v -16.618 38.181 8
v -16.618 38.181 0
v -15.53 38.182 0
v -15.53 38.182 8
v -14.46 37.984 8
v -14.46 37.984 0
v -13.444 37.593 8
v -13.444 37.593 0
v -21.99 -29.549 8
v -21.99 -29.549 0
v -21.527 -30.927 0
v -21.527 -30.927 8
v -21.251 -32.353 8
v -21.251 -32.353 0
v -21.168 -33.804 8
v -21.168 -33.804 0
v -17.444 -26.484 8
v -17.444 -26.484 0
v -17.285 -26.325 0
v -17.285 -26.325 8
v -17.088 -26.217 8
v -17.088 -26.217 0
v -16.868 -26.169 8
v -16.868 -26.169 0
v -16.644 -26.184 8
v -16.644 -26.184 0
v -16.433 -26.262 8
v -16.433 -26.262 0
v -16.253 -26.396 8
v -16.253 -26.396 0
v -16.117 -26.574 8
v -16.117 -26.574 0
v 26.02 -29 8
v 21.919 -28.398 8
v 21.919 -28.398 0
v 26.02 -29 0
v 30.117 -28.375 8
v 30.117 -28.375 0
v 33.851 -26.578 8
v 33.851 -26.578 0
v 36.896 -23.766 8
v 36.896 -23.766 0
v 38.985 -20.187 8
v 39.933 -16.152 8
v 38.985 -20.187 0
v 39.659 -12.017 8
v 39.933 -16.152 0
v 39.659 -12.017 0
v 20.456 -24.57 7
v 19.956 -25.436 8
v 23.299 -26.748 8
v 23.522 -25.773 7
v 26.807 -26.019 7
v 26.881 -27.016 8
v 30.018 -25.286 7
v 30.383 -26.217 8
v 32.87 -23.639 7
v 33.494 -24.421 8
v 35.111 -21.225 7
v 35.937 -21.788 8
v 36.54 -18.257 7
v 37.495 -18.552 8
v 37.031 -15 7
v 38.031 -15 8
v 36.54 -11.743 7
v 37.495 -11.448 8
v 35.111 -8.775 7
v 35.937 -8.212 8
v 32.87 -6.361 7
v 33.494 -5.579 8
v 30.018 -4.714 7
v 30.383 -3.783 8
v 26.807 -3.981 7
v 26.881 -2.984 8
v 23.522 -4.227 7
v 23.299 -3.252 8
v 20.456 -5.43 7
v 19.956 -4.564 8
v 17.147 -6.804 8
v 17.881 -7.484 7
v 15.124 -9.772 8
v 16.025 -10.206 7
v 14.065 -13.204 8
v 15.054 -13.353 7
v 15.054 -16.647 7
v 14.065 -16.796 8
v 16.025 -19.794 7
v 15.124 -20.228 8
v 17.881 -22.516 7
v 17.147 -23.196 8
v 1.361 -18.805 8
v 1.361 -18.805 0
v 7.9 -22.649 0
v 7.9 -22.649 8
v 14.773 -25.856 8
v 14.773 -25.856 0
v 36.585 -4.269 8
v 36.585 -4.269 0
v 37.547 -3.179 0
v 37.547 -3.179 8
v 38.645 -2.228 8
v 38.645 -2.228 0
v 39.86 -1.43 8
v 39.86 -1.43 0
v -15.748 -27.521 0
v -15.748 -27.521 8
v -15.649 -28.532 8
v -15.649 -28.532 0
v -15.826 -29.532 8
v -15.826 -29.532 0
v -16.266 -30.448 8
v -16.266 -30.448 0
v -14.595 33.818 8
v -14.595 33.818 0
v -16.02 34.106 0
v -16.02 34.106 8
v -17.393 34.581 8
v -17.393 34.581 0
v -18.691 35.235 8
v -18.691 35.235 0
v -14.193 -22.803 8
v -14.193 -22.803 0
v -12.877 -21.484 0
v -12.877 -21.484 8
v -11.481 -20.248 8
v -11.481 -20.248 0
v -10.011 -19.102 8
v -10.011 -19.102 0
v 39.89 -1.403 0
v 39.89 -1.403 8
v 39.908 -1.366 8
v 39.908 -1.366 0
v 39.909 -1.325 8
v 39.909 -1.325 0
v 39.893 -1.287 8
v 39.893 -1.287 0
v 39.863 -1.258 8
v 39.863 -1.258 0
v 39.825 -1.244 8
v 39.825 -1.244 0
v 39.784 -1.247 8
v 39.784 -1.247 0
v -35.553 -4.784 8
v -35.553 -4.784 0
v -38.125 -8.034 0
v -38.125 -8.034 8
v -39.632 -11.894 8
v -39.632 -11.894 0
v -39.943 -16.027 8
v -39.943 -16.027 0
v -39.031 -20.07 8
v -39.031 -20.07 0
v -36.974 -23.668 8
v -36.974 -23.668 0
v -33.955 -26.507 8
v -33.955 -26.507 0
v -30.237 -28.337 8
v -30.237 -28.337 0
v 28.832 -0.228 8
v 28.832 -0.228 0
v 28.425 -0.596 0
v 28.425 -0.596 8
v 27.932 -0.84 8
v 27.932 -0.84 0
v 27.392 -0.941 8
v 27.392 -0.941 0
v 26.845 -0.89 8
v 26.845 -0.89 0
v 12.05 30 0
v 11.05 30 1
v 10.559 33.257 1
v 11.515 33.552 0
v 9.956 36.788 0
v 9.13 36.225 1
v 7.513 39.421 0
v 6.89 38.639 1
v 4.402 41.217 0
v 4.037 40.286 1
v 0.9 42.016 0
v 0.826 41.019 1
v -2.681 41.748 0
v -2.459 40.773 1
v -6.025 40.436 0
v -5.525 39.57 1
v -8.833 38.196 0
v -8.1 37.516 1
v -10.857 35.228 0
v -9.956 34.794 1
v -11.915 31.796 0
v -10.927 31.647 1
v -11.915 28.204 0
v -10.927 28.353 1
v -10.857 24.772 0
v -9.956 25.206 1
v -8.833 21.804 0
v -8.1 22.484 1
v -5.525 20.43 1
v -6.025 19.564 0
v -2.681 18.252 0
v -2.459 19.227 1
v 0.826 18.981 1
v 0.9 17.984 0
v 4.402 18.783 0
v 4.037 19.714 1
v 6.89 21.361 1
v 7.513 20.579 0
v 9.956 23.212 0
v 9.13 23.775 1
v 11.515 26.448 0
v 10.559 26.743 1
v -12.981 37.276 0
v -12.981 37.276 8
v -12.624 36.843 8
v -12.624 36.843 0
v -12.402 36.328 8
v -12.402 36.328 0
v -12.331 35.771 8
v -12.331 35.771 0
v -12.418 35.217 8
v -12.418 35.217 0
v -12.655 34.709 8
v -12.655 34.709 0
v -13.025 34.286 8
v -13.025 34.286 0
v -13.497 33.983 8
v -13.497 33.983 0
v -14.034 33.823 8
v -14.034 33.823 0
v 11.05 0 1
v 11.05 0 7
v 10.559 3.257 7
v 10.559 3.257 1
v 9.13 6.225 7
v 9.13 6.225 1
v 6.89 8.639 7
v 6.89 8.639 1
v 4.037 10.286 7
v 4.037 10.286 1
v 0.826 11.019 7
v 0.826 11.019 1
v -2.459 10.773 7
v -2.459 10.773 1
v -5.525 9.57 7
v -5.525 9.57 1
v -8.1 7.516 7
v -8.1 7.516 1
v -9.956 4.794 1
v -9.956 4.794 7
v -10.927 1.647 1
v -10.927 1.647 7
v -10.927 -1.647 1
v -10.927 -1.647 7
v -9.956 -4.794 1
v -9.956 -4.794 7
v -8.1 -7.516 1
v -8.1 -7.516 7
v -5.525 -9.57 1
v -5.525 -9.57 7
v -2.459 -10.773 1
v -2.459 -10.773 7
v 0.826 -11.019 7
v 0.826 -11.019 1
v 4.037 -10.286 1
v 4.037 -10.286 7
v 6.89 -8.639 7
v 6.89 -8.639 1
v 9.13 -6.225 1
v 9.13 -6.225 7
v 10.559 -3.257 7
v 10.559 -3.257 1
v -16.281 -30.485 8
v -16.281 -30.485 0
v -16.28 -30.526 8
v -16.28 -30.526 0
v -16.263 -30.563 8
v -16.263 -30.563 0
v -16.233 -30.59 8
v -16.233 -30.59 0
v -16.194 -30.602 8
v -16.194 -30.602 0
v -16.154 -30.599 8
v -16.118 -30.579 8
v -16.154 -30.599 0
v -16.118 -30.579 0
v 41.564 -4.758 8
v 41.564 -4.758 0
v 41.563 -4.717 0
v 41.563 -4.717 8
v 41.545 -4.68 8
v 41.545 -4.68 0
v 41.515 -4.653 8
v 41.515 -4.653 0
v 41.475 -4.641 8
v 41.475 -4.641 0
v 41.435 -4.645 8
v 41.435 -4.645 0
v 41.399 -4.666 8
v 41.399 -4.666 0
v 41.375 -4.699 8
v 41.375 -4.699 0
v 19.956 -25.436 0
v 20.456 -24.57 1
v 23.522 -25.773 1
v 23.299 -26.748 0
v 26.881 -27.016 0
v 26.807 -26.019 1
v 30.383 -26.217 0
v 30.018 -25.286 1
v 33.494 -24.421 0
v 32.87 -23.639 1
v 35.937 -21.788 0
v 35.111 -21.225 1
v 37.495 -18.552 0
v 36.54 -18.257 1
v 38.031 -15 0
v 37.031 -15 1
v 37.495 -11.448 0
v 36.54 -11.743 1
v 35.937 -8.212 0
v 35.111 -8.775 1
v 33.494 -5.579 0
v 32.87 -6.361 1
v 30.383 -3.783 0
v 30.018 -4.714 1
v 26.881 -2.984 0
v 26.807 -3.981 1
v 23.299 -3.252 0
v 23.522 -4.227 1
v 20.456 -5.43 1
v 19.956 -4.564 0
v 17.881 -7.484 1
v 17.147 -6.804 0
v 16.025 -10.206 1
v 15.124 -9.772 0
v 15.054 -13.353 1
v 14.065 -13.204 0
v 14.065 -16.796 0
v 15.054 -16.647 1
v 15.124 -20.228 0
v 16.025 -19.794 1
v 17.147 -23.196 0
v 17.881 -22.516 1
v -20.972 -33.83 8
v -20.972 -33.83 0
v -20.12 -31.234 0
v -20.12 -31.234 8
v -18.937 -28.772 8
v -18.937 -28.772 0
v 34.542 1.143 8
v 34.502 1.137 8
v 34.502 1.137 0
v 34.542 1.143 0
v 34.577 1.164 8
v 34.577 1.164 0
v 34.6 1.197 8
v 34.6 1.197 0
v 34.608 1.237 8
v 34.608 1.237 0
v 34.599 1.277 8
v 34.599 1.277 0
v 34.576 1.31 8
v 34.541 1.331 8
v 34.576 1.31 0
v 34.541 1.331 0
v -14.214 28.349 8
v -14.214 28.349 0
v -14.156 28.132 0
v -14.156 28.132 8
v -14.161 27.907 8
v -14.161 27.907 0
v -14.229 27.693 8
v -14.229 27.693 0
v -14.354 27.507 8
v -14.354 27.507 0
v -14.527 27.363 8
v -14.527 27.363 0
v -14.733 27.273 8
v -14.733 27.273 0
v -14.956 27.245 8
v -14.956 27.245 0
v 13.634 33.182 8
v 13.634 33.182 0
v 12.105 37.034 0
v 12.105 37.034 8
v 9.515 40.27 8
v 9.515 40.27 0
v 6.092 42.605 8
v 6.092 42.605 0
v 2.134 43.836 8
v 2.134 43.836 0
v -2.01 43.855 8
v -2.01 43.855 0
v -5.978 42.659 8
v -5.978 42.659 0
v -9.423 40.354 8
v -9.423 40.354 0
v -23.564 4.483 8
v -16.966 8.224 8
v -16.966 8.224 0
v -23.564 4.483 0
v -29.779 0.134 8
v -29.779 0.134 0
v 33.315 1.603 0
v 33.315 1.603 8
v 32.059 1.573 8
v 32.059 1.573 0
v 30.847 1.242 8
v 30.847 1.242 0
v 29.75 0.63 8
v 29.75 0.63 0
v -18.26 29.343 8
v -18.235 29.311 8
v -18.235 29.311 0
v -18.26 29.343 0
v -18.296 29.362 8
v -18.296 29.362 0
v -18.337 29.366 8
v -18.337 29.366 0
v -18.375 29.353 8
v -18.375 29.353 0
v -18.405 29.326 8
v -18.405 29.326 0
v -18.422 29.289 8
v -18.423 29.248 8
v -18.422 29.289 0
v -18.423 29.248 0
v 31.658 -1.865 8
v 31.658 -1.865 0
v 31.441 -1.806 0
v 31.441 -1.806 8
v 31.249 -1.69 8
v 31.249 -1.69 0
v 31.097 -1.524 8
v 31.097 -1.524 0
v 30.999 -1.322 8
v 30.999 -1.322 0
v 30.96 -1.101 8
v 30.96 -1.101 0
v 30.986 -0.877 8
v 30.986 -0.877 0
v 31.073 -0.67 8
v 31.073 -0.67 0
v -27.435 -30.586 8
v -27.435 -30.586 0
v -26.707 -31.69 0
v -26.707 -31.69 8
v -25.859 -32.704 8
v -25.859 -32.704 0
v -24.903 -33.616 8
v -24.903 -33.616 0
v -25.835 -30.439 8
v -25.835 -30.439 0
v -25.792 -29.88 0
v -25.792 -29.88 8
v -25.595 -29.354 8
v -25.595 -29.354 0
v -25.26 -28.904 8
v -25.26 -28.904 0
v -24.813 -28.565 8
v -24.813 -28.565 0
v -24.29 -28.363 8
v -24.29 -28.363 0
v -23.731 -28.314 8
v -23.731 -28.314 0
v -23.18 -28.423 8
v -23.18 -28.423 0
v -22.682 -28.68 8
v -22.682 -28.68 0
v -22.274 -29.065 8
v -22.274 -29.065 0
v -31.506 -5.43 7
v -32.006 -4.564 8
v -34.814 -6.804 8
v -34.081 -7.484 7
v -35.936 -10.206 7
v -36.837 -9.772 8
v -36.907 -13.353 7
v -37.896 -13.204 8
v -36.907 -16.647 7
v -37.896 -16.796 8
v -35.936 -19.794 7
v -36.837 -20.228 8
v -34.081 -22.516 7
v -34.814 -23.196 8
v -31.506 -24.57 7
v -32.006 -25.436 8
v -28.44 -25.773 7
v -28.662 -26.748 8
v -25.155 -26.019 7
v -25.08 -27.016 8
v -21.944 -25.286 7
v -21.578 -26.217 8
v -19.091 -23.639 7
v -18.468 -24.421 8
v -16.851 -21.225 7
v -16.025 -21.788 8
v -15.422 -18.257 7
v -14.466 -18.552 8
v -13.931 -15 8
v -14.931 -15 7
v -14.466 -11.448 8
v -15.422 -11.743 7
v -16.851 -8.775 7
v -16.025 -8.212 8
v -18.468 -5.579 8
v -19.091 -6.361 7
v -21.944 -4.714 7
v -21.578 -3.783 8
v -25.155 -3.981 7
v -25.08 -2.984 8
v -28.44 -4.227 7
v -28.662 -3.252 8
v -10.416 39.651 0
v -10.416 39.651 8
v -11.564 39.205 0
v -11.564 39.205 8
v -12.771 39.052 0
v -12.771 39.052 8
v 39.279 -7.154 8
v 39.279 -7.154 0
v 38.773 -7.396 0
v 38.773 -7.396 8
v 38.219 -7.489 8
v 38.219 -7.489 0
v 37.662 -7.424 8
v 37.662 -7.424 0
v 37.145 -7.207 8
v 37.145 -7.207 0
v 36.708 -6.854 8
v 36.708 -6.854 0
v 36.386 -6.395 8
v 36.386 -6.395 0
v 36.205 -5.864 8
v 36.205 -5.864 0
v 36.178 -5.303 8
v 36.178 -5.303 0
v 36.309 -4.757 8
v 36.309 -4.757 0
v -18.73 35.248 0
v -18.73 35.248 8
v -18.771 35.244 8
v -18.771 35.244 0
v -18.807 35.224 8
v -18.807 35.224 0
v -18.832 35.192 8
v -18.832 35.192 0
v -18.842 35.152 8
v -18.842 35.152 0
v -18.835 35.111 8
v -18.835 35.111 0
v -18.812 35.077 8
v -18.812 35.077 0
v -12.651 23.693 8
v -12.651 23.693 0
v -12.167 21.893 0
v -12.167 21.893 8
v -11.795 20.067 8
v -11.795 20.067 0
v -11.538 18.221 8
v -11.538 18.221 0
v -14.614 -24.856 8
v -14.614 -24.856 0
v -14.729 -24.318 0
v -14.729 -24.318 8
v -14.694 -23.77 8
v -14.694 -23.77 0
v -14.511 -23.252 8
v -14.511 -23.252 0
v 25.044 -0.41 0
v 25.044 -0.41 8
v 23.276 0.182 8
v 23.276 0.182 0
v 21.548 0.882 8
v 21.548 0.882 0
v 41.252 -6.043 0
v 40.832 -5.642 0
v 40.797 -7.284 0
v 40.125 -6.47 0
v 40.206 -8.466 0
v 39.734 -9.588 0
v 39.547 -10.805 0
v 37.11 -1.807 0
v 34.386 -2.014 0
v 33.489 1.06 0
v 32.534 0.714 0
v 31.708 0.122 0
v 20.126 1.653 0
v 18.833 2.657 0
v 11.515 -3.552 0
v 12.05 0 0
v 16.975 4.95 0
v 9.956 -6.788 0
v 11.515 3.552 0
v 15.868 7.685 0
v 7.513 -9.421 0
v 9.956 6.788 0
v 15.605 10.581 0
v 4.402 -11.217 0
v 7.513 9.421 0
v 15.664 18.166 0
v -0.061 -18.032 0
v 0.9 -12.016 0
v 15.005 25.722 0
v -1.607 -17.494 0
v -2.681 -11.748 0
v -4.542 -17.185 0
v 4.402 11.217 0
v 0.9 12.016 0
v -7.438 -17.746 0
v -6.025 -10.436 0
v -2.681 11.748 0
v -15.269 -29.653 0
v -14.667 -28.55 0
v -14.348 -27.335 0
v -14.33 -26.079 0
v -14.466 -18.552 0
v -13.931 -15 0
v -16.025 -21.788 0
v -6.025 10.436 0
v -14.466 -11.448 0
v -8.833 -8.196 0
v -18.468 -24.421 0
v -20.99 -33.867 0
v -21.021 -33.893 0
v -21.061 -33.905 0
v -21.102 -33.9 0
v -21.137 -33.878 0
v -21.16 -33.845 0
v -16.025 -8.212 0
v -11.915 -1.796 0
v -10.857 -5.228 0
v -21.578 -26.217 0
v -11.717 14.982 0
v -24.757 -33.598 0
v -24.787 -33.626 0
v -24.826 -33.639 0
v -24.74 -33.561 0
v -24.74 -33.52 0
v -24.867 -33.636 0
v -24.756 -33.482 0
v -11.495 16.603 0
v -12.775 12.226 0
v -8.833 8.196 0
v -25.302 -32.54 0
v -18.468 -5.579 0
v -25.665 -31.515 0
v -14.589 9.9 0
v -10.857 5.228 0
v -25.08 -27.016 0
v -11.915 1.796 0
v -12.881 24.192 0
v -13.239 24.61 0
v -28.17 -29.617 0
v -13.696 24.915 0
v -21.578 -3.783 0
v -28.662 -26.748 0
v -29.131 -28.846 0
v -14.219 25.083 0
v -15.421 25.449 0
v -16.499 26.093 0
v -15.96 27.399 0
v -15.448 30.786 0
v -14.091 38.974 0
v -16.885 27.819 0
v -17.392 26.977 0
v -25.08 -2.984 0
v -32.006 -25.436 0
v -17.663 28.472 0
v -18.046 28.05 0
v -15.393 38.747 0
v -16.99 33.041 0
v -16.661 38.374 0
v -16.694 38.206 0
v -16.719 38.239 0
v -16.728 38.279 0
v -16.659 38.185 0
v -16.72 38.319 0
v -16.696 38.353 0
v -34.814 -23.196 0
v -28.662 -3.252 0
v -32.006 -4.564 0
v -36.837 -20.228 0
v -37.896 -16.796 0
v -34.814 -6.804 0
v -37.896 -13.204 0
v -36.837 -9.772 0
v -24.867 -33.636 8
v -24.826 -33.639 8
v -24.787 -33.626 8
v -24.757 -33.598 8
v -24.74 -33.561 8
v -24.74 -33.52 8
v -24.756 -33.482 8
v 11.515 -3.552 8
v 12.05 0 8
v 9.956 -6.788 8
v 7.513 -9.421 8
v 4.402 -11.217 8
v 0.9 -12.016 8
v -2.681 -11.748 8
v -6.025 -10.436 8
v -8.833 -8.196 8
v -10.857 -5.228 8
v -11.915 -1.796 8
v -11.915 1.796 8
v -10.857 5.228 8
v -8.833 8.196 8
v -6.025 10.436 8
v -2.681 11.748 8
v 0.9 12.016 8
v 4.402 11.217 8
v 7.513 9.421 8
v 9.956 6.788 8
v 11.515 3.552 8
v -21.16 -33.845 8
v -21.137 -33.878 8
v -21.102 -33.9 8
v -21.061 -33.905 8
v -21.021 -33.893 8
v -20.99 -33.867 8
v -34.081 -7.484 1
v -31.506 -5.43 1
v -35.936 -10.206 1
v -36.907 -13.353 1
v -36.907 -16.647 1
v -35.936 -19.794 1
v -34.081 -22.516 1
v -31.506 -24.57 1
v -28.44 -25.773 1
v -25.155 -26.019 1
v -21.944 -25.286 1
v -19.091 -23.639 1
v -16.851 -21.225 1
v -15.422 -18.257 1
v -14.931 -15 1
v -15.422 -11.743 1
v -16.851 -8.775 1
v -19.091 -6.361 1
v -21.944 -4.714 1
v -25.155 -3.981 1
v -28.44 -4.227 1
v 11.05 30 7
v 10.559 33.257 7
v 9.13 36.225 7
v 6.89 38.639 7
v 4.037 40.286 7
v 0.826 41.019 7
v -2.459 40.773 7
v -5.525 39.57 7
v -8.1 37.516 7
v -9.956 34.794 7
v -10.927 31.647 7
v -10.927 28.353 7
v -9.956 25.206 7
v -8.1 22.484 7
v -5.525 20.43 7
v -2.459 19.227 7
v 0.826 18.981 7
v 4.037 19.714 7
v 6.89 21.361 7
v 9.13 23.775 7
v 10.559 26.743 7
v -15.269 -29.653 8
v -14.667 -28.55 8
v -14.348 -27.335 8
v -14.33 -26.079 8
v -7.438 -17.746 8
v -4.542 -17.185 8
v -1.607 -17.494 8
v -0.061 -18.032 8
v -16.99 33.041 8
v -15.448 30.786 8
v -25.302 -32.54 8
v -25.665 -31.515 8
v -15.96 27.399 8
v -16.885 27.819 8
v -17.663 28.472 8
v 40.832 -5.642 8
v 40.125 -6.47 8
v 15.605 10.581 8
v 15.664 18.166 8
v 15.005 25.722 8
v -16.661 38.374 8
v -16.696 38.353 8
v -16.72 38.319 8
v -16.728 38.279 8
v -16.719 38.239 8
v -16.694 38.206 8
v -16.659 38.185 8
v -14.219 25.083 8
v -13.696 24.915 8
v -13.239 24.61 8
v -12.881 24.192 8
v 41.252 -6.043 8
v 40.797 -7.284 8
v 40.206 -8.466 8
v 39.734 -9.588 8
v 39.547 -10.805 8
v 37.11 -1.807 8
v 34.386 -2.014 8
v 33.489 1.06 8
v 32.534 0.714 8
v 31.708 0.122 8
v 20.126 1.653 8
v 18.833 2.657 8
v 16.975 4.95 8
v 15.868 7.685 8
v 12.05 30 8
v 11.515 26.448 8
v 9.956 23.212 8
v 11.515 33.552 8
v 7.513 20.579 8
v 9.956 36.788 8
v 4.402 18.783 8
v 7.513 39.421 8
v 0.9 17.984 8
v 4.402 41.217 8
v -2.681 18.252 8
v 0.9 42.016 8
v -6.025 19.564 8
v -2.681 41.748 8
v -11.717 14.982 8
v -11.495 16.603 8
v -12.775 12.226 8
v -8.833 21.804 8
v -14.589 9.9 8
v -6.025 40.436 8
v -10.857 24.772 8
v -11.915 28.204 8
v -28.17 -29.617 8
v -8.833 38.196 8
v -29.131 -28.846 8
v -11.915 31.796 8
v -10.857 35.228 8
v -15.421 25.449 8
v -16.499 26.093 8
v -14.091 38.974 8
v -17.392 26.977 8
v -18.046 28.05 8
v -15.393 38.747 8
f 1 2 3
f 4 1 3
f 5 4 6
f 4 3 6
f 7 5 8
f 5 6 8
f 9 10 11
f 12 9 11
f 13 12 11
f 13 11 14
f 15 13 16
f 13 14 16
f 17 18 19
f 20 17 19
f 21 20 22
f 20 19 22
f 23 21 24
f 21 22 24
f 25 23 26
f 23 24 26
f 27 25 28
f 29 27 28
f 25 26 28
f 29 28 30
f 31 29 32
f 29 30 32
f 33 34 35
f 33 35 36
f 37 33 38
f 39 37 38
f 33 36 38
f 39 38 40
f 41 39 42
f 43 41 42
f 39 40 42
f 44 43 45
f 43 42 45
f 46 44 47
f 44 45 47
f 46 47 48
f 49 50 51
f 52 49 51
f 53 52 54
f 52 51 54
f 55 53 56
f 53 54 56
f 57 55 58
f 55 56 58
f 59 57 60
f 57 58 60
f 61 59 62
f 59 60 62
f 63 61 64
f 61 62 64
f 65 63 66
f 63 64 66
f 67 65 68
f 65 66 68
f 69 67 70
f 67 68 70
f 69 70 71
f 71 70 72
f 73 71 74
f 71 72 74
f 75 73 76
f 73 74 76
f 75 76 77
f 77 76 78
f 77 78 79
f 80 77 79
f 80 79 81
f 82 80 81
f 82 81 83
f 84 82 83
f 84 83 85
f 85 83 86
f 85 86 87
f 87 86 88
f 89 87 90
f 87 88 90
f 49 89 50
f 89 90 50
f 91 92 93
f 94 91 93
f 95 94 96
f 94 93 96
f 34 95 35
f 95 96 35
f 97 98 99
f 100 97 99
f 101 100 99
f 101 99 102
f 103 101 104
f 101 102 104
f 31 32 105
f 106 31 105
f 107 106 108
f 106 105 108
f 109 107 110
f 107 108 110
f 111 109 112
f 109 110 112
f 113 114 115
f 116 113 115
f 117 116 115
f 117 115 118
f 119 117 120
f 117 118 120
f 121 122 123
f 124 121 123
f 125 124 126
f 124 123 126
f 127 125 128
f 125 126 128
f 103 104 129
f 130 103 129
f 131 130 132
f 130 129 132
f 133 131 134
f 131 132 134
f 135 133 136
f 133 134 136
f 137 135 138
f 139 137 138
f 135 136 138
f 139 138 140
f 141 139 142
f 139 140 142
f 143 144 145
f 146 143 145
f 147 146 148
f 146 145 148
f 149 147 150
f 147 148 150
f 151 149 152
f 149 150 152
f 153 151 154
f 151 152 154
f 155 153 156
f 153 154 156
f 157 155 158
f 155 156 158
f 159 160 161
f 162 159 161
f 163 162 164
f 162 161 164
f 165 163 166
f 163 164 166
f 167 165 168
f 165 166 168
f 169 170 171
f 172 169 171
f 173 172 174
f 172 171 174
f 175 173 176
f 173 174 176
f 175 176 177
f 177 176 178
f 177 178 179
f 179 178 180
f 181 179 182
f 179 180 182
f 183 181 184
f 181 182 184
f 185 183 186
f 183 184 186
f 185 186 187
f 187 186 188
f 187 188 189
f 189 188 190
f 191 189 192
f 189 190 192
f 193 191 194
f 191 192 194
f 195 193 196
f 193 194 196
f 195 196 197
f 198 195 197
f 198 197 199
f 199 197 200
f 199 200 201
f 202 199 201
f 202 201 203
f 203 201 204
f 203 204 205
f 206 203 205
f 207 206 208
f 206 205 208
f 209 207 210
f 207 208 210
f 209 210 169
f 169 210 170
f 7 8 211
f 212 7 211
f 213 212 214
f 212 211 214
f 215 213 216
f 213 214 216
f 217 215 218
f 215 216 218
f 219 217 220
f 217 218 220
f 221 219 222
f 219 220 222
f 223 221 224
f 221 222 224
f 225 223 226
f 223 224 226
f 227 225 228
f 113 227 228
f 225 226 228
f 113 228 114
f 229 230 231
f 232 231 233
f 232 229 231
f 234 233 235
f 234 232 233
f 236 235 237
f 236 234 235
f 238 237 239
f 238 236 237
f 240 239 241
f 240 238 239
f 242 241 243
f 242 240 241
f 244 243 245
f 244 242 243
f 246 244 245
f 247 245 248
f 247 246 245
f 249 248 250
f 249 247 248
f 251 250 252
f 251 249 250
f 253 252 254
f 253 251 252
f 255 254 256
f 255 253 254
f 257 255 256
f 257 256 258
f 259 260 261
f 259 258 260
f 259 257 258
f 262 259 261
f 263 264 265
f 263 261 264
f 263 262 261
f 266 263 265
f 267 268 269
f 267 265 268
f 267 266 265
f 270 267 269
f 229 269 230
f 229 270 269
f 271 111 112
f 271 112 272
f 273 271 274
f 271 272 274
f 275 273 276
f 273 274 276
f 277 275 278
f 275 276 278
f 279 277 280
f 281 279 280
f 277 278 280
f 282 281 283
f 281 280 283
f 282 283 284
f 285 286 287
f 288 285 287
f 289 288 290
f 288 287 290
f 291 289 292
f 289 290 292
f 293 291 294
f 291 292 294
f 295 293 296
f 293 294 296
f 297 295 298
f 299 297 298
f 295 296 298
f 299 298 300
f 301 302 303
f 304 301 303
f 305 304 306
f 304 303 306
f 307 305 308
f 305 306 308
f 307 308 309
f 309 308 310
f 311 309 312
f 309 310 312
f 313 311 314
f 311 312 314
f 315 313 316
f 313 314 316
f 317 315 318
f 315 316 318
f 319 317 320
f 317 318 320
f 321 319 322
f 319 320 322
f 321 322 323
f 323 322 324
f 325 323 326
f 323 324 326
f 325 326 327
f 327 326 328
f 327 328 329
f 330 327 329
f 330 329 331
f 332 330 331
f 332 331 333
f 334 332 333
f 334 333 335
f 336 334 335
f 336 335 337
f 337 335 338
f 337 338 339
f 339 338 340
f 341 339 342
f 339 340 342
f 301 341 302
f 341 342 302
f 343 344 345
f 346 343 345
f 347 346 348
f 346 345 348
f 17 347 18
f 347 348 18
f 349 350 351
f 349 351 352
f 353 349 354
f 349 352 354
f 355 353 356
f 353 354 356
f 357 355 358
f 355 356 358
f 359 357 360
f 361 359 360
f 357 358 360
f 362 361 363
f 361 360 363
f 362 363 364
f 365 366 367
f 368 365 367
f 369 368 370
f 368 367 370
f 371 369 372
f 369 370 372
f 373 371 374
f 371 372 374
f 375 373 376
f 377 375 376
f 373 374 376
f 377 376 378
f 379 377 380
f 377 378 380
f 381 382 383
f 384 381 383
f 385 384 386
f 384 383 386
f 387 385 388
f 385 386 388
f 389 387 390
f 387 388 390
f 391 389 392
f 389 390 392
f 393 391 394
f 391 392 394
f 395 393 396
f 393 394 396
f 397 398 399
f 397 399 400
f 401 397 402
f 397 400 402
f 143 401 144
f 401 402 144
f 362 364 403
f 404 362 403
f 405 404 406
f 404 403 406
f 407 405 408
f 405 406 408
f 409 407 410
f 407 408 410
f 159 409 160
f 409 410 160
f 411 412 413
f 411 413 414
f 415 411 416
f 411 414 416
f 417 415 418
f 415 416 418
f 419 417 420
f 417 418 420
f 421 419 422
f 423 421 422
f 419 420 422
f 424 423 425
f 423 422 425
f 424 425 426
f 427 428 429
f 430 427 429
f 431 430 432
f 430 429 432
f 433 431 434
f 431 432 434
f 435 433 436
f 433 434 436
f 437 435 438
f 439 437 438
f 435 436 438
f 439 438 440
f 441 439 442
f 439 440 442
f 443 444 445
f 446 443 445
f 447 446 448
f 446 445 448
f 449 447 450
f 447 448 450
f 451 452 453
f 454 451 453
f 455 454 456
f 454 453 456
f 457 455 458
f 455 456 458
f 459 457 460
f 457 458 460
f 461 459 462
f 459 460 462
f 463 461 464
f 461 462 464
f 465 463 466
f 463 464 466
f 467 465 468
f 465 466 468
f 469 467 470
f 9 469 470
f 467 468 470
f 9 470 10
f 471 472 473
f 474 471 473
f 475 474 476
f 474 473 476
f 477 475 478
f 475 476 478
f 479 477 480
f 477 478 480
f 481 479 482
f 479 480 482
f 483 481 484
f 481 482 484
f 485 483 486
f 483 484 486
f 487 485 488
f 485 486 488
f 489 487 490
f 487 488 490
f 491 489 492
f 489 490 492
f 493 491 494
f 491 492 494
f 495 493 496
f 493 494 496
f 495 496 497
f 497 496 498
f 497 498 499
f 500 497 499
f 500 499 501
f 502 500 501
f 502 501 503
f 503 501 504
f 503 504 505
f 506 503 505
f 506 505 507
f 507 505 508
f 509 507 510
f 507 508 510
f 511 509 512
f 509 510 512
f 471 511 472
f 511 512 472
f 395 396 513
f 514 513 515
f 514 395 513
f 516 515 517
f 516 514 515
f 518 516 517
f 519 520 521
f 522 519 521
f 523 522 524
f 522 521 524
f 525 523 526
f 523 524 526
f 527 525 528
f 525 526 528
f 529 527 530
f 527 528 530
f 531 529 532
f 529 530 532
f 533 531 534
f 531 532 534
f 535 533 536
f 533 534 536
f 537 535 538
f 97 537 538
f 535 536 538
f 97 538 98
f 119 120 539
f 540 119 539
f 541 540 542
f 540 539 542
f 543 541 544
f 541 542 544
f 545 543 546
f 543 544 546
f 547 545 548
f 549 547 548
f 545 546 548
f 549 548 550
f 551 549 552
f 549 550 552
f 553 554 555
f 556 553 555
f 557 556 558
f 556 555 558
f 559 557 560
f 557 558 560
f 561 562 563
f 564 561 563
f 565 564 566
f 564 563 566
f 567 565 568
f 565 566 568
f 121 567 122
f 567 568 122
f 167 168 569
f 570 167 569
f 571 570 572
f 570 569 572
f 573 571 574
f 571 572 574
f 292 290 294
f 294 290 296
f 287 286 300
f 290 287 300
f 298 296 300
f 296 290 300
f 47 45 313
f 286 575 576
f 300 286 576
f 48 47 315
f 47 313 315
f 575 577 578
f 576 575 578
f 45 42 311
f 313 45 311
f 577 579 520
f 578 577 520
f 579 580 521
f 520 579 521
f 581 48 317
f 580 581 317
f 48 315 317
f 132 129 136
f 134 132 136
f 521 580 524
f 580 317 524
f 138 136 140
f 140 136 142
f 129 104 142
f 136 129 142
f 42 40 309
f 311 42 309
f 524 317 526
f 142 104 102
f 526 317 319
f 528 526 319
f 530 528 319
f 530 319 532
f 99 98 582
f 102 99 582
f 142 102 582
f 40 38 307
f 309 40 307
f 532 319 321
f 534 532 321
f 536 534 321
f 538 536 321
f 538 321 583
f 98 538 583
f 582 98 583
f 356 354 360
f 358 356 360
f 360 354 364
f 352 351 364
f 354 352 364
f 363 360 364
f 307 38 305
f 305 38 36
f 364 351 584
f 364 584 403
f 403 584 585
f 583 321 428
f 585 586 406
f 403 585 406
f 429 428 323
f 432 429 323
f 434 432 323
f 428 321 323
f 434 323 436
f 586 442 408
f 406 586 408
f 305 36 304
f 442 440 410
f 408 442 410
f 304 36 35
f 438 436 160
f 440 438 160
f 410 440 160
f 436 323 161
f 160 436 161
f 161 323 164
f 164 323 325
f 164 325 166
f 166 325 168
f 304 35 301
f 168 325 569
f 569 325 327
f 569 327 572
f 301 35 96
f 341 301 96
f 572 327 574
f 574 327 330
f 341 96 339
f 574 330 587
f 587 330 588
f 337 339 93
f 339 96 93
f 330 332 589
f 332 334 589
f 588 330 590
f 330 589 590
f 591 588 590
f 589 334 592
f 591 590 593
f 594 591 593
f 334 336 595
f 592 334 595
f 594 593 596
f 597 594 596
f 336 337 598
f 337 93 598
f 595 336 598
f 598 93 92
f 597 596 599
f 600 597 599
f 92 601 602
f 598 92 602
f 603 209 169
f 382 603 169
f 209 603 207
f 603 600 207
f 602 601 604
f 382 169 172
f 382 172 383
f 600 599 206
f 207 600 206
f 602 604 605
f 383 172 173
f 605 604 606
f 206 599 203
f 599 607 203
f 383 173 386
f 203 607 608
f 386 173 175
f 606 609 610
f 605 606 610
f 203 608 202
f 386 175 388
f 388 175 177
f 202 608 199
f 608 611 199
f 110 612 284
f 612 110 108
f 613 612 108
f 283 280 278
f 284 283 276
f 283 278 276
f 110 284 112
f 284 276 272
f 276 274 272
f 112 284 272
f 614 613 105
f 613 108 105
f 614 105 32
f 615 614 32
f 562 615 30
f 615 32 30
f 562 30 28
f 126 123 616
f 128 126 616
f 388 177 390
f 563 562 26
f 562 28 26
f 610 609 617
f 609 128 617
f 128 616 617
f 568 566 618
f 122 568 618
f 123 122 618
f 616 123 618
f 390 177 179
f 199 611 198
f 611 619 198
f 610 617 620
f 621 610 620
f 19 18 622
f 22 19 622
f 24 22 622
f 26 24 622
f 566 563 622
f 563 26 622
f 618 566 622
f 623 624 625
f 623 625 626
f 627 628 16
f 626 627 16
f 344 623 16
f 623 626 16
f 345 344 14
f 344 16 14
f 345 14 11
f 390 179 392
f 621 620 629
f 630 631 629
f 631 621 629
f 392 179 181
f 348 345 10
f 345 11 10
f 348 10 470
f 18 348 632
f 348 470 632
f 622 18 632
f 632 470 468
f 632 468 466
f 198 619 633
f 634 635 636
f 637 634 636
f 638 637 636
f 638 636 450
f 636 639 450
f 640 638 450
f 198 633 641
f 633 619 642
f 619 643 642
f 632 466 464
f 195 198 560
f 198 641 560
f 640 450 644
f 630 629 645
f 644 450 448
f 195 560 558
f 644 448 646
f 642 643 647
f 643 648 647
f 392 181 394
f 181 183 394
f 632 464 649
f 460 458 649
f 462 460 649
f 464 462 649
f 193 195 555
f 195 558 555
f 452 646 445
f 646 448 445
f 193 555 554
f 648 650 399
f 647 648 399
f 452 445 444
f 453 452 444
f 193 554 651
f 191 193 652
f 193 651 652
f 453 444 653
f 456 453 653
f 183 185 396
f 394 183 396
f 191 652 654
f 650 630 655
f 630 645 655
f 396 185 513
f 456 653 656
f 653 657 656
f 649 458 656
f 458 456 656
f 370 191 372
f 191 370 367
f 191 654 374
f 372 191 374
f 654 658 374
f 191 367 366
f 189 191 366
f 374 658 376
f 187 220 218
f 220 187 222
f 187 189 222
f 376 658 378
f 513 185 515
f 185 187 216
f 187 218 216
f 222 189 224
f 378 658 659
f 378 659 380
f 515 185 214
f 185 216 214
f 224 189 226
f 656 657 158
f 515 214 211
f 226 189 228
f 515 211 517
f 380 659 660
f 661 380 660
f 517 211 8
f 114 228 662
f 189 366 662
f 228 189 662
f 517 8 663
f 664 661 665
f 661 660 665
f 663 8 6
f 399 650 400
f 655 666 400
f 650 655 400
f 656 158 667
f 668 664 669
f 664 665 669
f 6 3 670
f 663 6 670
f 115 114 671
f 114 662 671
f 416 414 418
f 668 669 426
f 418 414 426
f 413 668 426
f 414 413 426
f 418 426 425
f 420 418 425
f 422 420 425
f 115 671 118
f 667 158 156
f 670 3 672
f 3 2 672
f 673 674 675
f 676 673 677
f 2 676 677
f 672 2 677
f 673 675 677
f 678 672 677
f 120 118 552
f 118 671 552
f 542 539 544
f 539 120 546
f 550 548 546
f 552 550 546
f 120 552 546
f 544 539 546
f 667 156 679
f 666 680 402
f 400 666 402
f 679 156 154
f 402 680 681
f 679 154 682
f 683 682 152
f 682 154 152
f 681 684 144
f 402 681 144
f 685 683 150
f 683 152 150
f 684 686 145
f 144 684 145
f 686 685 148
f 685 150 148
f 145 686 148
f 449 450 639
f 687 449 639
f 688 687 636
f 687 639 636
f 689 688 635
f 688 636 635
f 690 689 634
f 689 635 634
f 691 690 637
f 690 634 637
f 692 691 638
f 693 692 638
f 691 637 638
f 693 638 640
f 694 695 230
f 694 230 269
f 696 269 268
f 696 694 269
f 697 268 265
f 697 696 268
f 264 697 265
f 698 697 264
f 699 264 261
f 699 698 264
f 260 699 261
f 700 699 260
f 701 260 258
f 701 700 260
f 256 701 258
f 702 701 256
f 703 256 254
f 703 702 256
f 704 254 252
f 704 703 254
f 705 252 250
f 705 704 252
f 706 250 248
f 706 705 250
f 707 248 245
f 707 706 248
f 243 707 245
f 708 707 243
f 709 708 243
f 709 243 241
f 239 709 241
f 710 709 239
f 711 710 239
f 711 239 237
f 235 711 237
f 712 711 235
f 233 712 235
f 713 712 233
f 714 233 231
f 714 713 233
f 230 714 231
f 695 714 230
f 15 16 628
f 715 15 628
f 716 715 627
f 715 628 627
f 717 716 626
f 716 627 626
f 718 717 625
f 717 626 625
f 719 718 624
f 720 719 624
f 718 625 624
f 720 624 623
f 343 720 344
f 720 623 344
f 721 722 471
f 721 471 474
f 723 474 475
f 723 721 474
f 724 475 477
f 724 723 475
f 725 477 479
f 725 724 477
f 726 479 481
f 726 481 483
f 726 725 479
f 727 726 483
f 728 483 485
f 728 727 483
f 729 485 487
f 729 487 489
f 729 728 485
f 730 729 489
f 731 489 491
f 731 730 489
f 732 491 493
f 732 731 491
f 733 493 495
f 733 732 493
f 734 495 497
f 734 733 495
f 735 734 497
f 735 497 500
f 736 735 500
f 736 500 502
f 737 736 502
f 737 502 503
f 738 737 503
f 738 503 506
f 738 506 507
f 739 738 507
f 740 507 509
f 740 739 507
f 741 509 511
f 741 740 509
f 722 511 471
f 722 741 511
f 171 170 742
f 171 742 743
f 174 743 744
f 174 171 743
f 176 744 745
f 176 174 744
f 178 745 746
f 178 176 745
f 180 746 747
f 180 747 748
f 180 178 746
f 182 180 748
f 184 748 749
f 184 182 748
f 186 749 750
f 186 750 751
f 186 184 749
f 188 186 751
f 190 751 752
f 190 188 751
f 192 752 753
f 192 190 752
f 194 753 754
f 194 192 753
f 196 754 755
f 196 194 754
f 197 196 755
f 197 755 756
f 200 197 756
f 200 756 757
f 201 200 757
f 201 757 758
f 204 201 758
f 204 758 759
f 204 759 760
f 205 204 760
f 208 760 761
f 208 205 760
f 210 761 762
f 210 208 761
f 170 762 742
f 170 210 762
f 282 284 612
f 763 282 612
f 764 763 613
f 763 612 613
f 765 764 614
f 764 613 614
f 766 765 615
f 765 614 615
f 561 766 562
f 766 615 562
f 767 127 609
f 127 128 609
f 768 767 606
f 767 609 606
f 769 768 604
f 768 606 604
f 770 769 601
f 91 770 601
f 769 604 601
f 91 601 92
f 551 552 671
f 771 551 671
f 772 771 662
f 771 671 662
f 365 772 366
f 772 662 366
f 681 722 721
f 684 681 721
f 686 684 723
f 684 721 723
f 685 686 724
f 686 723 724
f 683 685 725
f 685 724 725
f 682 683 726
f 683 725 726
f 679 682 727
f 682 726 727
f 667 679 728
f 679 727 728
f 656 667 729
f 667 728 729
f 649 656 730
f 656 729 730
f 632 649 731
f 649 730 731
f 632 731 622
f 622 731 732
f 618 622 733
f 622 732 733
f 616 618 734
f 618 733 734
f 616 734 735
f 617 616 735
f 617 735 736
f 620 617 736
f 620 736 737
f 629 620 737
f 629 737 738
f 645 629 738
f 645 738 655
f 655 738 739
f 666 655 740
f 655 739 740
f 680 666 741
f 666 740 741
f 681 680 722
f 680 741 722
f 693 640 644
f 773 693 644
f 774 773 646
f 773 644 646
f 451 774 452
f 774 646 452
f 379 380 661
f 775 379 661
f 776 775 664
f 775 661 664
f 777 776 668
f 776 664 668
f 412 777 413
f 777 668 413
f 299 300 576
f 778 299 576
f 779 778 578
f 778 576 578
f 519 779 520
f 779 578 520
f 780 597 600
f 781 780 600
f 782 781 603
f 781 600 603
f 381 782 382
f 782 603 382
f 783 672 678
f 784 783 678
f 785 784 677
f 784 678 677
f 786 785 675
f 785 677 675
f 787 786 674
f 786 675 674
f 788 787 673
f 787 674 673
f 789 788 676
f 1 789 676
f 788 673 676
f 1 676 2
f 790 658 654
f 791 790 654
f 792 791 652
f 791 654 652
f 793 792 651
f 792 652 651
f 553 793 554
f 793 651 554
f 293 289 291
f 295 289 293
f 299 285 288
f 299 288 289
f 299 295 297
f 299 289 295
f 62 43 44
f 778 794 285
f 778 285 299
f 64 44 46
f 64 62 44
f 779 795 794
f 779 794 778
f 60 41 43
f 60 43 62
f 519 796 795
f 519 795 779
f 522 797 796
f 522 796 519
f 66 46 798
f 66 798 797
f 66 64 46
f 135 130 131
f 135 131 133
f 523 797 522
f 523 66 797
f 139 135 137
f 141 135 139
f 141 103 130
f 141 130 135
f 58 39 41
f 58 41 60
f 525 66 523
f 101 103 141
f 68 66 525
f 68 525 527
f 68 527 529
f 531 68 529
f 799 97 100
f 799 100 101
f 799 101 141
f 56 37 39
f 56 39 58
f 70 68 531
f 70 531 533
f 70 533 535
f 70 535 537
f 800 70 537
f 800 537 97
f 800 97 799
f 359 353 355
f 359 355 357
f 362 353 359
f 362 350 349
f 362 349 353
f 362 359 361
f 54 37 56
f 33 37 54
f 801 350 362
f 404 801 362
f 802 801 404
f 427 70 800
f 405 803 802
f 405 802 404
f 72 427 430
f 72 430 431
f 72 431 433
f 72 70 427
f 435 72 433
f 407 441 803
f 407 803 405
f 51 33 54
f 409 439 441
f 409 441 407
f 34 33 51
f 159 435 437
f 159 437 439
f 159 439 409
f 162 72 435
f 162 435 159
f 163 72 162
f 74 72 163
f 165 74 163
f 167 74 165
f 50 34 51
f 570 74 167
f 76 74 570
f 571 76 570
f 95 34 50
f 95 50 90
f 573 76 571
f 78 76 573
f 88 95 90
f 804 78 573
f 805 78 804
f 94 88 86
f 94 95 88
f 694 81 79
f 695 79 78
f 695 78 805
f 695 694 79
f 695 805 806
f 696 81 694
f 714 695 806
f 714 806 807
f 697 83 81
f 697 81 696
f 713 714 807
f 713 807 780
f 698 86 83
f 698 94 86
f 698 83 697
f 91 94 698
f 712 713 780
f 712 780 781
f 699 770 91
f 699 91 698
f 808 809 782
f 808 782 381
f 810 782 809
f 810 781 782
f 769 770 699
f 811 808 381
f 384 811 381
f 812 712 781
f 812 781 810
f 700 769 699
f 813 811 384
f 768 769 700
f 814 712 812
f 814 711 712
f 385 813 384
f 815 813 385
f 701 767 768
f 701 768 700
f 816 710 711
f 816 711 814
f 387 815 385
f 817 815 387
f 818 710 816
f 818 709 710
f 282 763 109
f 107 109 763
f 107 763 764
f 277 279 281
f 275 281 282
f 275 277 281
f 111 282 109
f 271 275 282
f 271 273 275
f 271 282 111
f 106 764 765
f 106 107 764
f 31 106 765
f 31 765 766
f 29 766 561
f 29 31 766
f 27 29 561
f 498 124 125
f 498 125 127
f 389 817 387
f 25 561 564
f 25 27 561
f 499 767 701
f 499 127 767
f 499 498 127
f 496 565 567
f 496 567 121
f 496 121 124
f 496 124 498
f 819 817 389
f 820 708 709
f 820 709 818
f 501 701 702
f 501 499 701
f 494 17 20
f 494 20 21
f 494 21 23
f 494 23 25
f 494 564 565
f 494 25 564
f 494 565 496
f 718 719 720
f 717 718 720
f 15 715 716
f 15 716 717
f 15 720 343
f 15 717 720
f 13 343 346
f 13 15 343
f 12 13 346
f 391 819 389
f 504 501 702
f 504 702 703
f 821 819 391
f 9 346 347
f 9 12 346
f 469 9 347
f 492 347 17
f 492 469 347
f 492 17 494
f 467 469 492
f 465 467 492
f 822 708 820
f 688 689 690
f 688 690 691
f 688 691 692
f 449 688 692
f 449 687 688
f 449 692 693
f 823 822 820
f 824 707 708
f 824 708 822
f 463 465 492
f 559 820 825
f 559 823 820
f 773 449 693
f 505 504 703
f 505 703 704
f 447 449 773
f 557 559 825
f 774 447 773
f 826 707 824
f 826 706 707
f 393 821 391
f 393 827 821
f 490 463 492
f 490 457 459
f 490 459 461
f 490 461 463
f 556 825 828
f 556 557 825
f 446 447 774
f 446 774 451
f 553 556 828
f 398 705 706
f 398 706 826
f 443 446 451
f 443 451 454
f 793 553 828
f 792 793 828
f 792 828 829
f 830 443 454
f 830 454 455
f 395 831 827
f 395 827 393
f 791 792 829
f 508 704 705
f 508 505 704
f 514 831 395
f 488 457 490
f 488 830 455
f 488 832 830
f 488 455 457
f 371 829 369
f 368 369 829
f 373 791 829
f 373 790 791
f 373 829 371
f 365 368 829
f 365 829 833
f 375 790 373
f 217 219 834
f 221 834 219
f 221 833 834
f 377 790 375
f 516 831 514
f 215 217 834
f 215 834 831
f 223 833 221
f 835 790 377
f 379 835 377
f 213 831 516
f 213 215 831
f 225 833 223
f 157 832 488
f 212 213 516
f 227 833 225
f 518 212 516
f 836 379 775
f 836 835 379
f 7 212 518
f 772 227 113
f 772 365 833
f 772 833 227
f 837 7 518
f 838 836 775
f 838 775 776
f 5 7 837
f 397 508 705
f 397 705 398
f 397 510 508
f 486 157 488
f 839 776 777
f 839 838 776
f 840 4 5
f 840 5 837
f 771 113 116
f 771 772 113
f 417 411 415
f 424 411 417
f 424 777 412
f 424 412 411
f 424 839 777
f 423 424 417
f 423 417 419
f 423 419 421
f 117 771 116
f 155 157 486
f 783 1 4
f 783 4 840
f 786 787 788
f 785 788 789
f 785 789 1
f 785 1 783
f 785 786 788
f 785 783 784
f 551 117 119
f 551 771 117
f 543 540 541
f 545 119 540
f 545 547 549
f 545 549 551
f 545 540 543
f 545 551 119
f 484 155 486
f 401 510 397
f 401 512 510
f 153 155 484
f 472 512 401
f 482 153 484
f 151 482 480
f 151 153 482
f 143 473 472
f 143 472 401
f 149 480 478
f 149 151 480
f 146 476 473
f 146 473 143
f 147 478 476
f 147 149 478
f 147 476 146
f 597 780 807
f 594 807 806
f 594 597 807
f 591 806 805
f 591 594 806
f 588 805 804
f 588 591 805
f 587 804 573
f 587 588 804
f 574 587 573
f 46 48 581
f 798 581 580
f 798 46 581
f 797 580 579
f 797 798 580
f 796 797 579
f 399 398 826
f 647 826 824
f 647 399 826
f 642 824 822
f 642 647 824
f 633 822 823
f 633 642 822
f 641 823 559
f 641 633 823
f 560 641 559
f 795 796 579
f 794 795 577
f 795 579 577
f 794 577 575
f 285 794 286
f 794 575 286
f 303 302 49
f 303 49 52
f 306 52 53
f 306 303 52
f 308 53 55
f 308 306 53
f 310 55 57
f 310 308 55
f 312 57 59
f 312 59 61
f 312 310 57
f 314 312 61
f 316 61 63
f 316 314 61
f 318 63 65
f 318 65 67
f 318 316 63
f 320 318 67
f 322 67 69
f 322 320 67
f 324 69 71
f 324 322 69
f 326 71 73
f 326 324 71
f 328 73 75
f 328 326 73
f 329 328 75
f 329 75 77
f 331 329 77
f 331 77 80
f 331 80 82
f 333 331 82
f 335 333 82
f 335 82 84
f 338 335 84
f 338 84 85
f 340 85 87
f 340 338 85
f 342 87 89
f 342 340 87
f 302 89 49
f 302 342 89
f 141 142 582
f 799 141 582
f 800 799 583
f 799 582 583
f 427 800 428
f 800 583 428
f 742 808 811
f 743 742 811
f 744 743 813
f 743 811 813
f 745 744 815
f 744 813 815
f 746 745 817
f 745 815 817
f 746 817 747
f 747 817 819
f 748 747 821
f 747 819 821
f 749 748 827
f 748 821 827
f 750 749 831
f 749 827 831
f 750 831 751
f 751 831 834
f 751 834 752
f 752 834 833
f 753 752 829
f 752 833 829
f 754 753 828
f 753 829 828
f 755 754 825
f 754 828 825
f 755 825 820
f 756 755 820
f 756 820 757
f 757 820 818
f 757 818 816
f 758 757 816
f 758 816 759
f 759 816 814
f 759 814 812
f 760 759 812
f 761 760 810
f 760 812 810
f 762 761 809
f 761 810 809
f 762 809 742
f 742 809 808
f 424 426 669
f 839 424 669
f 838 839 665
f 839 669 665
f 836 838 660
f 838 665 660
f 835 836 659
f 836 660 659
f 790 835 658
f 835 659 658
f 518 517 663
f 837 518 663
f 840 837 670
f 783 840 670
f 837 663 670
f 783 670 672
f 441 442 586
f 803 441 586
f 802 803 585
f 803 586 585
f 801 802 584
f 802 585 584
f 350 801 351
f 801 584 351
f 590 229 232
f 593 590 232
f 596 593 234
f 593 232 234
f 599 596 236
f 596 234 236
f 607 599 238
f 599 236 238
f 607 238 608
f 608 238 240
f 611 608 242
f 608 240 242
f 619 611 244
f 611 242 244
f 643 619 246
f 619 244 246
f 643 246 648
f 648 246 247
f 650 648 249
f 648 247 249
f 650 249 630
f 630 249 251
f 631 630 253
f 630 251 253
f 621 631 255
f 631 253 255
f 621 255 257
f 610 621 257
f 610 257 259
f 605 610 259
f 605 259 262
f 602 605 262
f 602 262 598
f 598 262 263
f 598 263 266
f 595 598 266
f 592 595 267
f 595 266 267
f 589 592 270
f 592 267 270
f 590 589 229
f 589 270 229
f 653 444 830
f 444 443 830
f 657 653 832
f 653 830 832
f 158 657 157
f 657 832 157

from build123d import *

# Parameters (mm, degrees)
F0_R     = 11.05
F1_DEPTH = 8
F2_COUNT = 3
F3_R     = 10
F4_R     = 5
F5_SIZE  = 1


with BuildPart() as f1:
    # F0 (on Top) → F1 (new body)
    with BuildSketch(Plane.XY):
        with BuildLine():
            ThreePointArc((-12.6514260567, 23.6933629251), (-11.3751248169, 14.1917767316), (-13.1613477418, 4.7727272727))
            ThreePointArc((-13.1613477418, 4.7727272727), (-3.9842769003, -13.421085559), (13.6336360909, -3.1818181818))
            ThreePointArc((13.6336360909, -3.1818181818), (15.7271441431, 15), (13.6336360909, 33.1818181818))
            ThreePointArc((13.6336360909, 33.1818181818), (3.1856807408, 43.6327340698), (-10.8117310602, 38.8941818894))
            ThreePointArc((-10.8117310602, 38.8941818894), (-13.7694685953, 39.0065439815), (-16.6610679634, 38.374492037))
            ThreePointArc((-16.6610679634, 38.374492037), (-16.7251928987, 38.2586862032), (-16.6182205389, 38.1807124082))
            ThreePointArc((-16.6182205389, 38.1807124082), (-14.990242489, 38.1077523786), (-13.4439973475, 37.5932024207))
            ThreePointArc((-13.4439973475, 37.5932024207), (-12.4179647139, 35.2171421288), (-14.5954308534, 33.8181972809))
            ThreePointArc((-14.5954308534, 33.8181972809), (-16.7144110874, 34.3205676404), (-18.6910590274, 35.2345239477))
            ThreePointArc((-18.6910590274, 35.2345239477), (-18.82124029, 35.2092689611), (-18.8118896462, 35.0769906902))
            ThreePointArc((-18.8118896462, 35.0769906902), (-16.1822484317, 31.9388495716), (-14.2139807274, 28.3487430493))
            ThreePointArc((-14.2139807274, 28.3487430493), (-14.2850540536, 27.5953224844), (-14.9557406683, 27.2447894188))
            ThreePointArc((-14.9557406683, 27.2447894188), (-16.8849368279, 27.8185608598), (-18.2353559933, 29.311001668))
            ThreePointArc((-18.2353559933, 29.311001668), (-18.3566059607, 29.361220693), (-18.4231712091, 29.2481164368))
            ThreePointArc((-18.4231712091, 29.2481164368), (-16.9723331855, 26.5082159897), (-14.218759745, 25.0834989167))
            ThreePointArc((-14.218759745, 25.0834989167), (-13.2385127521, 24.6100687257), (-12.6514260567, 23.6933629251))
        make_face()
        Circle(F0_R, mode=Mode.SUBTRACT)
        with Locations((0, 30)):
            Circle(F0_R, mode=Mode.SUBTRACT)
    extrude(amount=F1_DEPTH)

    # F2: F1 ×3 about axis
    f2_axis = Axis((0, 0, 0), (0, 0, -1))


with BuildPart() as f1_1:
    add(f1.part)
    for i in range(1, F2_COUNT):
        add(f1.part.rotate(f2_axis, i * 360 / F2_COUNT))

    # F3
    f3_edges = [f1_1.edges().sort_by_distance(p)[0] for p in [
        (15.072251, 4.78462, 4),
        (-3.392523, -15.445263, 4),
        (-11.679728, 10.660642, 4),
    ]]
    fillet(f3_edges, radius=F3_R)

    # F4
    f4_edges = [f1_1.edges().sort_by_distance(p)[0] for p in [
        (-28.277484, -28.810325, 4),
        (39.089215, -10.083857, 4),
        (-10.811731, 38.894182, 4),
    ]]
    fillet(f4_edges, radius=F4_R)

    # F5
    f5_edges = [f1_1.edges().sort_by_distance(p)[0] for p in [
        (-11.05, 30, 8),
        (-11.05, 30, 0),
        (-11.05, 0, 8),
        (-11.05, 0, 0),
        (31.505762, -5.430419, 8),
        (31.505762, -5.430419, 0),
        (-20.455762, -24.569581, 8),
        (-20.455762, -24.569581, 0),
    ]]
    chamfer(f5_edges, length=F5_SIZE)


solid = f1_1.part
